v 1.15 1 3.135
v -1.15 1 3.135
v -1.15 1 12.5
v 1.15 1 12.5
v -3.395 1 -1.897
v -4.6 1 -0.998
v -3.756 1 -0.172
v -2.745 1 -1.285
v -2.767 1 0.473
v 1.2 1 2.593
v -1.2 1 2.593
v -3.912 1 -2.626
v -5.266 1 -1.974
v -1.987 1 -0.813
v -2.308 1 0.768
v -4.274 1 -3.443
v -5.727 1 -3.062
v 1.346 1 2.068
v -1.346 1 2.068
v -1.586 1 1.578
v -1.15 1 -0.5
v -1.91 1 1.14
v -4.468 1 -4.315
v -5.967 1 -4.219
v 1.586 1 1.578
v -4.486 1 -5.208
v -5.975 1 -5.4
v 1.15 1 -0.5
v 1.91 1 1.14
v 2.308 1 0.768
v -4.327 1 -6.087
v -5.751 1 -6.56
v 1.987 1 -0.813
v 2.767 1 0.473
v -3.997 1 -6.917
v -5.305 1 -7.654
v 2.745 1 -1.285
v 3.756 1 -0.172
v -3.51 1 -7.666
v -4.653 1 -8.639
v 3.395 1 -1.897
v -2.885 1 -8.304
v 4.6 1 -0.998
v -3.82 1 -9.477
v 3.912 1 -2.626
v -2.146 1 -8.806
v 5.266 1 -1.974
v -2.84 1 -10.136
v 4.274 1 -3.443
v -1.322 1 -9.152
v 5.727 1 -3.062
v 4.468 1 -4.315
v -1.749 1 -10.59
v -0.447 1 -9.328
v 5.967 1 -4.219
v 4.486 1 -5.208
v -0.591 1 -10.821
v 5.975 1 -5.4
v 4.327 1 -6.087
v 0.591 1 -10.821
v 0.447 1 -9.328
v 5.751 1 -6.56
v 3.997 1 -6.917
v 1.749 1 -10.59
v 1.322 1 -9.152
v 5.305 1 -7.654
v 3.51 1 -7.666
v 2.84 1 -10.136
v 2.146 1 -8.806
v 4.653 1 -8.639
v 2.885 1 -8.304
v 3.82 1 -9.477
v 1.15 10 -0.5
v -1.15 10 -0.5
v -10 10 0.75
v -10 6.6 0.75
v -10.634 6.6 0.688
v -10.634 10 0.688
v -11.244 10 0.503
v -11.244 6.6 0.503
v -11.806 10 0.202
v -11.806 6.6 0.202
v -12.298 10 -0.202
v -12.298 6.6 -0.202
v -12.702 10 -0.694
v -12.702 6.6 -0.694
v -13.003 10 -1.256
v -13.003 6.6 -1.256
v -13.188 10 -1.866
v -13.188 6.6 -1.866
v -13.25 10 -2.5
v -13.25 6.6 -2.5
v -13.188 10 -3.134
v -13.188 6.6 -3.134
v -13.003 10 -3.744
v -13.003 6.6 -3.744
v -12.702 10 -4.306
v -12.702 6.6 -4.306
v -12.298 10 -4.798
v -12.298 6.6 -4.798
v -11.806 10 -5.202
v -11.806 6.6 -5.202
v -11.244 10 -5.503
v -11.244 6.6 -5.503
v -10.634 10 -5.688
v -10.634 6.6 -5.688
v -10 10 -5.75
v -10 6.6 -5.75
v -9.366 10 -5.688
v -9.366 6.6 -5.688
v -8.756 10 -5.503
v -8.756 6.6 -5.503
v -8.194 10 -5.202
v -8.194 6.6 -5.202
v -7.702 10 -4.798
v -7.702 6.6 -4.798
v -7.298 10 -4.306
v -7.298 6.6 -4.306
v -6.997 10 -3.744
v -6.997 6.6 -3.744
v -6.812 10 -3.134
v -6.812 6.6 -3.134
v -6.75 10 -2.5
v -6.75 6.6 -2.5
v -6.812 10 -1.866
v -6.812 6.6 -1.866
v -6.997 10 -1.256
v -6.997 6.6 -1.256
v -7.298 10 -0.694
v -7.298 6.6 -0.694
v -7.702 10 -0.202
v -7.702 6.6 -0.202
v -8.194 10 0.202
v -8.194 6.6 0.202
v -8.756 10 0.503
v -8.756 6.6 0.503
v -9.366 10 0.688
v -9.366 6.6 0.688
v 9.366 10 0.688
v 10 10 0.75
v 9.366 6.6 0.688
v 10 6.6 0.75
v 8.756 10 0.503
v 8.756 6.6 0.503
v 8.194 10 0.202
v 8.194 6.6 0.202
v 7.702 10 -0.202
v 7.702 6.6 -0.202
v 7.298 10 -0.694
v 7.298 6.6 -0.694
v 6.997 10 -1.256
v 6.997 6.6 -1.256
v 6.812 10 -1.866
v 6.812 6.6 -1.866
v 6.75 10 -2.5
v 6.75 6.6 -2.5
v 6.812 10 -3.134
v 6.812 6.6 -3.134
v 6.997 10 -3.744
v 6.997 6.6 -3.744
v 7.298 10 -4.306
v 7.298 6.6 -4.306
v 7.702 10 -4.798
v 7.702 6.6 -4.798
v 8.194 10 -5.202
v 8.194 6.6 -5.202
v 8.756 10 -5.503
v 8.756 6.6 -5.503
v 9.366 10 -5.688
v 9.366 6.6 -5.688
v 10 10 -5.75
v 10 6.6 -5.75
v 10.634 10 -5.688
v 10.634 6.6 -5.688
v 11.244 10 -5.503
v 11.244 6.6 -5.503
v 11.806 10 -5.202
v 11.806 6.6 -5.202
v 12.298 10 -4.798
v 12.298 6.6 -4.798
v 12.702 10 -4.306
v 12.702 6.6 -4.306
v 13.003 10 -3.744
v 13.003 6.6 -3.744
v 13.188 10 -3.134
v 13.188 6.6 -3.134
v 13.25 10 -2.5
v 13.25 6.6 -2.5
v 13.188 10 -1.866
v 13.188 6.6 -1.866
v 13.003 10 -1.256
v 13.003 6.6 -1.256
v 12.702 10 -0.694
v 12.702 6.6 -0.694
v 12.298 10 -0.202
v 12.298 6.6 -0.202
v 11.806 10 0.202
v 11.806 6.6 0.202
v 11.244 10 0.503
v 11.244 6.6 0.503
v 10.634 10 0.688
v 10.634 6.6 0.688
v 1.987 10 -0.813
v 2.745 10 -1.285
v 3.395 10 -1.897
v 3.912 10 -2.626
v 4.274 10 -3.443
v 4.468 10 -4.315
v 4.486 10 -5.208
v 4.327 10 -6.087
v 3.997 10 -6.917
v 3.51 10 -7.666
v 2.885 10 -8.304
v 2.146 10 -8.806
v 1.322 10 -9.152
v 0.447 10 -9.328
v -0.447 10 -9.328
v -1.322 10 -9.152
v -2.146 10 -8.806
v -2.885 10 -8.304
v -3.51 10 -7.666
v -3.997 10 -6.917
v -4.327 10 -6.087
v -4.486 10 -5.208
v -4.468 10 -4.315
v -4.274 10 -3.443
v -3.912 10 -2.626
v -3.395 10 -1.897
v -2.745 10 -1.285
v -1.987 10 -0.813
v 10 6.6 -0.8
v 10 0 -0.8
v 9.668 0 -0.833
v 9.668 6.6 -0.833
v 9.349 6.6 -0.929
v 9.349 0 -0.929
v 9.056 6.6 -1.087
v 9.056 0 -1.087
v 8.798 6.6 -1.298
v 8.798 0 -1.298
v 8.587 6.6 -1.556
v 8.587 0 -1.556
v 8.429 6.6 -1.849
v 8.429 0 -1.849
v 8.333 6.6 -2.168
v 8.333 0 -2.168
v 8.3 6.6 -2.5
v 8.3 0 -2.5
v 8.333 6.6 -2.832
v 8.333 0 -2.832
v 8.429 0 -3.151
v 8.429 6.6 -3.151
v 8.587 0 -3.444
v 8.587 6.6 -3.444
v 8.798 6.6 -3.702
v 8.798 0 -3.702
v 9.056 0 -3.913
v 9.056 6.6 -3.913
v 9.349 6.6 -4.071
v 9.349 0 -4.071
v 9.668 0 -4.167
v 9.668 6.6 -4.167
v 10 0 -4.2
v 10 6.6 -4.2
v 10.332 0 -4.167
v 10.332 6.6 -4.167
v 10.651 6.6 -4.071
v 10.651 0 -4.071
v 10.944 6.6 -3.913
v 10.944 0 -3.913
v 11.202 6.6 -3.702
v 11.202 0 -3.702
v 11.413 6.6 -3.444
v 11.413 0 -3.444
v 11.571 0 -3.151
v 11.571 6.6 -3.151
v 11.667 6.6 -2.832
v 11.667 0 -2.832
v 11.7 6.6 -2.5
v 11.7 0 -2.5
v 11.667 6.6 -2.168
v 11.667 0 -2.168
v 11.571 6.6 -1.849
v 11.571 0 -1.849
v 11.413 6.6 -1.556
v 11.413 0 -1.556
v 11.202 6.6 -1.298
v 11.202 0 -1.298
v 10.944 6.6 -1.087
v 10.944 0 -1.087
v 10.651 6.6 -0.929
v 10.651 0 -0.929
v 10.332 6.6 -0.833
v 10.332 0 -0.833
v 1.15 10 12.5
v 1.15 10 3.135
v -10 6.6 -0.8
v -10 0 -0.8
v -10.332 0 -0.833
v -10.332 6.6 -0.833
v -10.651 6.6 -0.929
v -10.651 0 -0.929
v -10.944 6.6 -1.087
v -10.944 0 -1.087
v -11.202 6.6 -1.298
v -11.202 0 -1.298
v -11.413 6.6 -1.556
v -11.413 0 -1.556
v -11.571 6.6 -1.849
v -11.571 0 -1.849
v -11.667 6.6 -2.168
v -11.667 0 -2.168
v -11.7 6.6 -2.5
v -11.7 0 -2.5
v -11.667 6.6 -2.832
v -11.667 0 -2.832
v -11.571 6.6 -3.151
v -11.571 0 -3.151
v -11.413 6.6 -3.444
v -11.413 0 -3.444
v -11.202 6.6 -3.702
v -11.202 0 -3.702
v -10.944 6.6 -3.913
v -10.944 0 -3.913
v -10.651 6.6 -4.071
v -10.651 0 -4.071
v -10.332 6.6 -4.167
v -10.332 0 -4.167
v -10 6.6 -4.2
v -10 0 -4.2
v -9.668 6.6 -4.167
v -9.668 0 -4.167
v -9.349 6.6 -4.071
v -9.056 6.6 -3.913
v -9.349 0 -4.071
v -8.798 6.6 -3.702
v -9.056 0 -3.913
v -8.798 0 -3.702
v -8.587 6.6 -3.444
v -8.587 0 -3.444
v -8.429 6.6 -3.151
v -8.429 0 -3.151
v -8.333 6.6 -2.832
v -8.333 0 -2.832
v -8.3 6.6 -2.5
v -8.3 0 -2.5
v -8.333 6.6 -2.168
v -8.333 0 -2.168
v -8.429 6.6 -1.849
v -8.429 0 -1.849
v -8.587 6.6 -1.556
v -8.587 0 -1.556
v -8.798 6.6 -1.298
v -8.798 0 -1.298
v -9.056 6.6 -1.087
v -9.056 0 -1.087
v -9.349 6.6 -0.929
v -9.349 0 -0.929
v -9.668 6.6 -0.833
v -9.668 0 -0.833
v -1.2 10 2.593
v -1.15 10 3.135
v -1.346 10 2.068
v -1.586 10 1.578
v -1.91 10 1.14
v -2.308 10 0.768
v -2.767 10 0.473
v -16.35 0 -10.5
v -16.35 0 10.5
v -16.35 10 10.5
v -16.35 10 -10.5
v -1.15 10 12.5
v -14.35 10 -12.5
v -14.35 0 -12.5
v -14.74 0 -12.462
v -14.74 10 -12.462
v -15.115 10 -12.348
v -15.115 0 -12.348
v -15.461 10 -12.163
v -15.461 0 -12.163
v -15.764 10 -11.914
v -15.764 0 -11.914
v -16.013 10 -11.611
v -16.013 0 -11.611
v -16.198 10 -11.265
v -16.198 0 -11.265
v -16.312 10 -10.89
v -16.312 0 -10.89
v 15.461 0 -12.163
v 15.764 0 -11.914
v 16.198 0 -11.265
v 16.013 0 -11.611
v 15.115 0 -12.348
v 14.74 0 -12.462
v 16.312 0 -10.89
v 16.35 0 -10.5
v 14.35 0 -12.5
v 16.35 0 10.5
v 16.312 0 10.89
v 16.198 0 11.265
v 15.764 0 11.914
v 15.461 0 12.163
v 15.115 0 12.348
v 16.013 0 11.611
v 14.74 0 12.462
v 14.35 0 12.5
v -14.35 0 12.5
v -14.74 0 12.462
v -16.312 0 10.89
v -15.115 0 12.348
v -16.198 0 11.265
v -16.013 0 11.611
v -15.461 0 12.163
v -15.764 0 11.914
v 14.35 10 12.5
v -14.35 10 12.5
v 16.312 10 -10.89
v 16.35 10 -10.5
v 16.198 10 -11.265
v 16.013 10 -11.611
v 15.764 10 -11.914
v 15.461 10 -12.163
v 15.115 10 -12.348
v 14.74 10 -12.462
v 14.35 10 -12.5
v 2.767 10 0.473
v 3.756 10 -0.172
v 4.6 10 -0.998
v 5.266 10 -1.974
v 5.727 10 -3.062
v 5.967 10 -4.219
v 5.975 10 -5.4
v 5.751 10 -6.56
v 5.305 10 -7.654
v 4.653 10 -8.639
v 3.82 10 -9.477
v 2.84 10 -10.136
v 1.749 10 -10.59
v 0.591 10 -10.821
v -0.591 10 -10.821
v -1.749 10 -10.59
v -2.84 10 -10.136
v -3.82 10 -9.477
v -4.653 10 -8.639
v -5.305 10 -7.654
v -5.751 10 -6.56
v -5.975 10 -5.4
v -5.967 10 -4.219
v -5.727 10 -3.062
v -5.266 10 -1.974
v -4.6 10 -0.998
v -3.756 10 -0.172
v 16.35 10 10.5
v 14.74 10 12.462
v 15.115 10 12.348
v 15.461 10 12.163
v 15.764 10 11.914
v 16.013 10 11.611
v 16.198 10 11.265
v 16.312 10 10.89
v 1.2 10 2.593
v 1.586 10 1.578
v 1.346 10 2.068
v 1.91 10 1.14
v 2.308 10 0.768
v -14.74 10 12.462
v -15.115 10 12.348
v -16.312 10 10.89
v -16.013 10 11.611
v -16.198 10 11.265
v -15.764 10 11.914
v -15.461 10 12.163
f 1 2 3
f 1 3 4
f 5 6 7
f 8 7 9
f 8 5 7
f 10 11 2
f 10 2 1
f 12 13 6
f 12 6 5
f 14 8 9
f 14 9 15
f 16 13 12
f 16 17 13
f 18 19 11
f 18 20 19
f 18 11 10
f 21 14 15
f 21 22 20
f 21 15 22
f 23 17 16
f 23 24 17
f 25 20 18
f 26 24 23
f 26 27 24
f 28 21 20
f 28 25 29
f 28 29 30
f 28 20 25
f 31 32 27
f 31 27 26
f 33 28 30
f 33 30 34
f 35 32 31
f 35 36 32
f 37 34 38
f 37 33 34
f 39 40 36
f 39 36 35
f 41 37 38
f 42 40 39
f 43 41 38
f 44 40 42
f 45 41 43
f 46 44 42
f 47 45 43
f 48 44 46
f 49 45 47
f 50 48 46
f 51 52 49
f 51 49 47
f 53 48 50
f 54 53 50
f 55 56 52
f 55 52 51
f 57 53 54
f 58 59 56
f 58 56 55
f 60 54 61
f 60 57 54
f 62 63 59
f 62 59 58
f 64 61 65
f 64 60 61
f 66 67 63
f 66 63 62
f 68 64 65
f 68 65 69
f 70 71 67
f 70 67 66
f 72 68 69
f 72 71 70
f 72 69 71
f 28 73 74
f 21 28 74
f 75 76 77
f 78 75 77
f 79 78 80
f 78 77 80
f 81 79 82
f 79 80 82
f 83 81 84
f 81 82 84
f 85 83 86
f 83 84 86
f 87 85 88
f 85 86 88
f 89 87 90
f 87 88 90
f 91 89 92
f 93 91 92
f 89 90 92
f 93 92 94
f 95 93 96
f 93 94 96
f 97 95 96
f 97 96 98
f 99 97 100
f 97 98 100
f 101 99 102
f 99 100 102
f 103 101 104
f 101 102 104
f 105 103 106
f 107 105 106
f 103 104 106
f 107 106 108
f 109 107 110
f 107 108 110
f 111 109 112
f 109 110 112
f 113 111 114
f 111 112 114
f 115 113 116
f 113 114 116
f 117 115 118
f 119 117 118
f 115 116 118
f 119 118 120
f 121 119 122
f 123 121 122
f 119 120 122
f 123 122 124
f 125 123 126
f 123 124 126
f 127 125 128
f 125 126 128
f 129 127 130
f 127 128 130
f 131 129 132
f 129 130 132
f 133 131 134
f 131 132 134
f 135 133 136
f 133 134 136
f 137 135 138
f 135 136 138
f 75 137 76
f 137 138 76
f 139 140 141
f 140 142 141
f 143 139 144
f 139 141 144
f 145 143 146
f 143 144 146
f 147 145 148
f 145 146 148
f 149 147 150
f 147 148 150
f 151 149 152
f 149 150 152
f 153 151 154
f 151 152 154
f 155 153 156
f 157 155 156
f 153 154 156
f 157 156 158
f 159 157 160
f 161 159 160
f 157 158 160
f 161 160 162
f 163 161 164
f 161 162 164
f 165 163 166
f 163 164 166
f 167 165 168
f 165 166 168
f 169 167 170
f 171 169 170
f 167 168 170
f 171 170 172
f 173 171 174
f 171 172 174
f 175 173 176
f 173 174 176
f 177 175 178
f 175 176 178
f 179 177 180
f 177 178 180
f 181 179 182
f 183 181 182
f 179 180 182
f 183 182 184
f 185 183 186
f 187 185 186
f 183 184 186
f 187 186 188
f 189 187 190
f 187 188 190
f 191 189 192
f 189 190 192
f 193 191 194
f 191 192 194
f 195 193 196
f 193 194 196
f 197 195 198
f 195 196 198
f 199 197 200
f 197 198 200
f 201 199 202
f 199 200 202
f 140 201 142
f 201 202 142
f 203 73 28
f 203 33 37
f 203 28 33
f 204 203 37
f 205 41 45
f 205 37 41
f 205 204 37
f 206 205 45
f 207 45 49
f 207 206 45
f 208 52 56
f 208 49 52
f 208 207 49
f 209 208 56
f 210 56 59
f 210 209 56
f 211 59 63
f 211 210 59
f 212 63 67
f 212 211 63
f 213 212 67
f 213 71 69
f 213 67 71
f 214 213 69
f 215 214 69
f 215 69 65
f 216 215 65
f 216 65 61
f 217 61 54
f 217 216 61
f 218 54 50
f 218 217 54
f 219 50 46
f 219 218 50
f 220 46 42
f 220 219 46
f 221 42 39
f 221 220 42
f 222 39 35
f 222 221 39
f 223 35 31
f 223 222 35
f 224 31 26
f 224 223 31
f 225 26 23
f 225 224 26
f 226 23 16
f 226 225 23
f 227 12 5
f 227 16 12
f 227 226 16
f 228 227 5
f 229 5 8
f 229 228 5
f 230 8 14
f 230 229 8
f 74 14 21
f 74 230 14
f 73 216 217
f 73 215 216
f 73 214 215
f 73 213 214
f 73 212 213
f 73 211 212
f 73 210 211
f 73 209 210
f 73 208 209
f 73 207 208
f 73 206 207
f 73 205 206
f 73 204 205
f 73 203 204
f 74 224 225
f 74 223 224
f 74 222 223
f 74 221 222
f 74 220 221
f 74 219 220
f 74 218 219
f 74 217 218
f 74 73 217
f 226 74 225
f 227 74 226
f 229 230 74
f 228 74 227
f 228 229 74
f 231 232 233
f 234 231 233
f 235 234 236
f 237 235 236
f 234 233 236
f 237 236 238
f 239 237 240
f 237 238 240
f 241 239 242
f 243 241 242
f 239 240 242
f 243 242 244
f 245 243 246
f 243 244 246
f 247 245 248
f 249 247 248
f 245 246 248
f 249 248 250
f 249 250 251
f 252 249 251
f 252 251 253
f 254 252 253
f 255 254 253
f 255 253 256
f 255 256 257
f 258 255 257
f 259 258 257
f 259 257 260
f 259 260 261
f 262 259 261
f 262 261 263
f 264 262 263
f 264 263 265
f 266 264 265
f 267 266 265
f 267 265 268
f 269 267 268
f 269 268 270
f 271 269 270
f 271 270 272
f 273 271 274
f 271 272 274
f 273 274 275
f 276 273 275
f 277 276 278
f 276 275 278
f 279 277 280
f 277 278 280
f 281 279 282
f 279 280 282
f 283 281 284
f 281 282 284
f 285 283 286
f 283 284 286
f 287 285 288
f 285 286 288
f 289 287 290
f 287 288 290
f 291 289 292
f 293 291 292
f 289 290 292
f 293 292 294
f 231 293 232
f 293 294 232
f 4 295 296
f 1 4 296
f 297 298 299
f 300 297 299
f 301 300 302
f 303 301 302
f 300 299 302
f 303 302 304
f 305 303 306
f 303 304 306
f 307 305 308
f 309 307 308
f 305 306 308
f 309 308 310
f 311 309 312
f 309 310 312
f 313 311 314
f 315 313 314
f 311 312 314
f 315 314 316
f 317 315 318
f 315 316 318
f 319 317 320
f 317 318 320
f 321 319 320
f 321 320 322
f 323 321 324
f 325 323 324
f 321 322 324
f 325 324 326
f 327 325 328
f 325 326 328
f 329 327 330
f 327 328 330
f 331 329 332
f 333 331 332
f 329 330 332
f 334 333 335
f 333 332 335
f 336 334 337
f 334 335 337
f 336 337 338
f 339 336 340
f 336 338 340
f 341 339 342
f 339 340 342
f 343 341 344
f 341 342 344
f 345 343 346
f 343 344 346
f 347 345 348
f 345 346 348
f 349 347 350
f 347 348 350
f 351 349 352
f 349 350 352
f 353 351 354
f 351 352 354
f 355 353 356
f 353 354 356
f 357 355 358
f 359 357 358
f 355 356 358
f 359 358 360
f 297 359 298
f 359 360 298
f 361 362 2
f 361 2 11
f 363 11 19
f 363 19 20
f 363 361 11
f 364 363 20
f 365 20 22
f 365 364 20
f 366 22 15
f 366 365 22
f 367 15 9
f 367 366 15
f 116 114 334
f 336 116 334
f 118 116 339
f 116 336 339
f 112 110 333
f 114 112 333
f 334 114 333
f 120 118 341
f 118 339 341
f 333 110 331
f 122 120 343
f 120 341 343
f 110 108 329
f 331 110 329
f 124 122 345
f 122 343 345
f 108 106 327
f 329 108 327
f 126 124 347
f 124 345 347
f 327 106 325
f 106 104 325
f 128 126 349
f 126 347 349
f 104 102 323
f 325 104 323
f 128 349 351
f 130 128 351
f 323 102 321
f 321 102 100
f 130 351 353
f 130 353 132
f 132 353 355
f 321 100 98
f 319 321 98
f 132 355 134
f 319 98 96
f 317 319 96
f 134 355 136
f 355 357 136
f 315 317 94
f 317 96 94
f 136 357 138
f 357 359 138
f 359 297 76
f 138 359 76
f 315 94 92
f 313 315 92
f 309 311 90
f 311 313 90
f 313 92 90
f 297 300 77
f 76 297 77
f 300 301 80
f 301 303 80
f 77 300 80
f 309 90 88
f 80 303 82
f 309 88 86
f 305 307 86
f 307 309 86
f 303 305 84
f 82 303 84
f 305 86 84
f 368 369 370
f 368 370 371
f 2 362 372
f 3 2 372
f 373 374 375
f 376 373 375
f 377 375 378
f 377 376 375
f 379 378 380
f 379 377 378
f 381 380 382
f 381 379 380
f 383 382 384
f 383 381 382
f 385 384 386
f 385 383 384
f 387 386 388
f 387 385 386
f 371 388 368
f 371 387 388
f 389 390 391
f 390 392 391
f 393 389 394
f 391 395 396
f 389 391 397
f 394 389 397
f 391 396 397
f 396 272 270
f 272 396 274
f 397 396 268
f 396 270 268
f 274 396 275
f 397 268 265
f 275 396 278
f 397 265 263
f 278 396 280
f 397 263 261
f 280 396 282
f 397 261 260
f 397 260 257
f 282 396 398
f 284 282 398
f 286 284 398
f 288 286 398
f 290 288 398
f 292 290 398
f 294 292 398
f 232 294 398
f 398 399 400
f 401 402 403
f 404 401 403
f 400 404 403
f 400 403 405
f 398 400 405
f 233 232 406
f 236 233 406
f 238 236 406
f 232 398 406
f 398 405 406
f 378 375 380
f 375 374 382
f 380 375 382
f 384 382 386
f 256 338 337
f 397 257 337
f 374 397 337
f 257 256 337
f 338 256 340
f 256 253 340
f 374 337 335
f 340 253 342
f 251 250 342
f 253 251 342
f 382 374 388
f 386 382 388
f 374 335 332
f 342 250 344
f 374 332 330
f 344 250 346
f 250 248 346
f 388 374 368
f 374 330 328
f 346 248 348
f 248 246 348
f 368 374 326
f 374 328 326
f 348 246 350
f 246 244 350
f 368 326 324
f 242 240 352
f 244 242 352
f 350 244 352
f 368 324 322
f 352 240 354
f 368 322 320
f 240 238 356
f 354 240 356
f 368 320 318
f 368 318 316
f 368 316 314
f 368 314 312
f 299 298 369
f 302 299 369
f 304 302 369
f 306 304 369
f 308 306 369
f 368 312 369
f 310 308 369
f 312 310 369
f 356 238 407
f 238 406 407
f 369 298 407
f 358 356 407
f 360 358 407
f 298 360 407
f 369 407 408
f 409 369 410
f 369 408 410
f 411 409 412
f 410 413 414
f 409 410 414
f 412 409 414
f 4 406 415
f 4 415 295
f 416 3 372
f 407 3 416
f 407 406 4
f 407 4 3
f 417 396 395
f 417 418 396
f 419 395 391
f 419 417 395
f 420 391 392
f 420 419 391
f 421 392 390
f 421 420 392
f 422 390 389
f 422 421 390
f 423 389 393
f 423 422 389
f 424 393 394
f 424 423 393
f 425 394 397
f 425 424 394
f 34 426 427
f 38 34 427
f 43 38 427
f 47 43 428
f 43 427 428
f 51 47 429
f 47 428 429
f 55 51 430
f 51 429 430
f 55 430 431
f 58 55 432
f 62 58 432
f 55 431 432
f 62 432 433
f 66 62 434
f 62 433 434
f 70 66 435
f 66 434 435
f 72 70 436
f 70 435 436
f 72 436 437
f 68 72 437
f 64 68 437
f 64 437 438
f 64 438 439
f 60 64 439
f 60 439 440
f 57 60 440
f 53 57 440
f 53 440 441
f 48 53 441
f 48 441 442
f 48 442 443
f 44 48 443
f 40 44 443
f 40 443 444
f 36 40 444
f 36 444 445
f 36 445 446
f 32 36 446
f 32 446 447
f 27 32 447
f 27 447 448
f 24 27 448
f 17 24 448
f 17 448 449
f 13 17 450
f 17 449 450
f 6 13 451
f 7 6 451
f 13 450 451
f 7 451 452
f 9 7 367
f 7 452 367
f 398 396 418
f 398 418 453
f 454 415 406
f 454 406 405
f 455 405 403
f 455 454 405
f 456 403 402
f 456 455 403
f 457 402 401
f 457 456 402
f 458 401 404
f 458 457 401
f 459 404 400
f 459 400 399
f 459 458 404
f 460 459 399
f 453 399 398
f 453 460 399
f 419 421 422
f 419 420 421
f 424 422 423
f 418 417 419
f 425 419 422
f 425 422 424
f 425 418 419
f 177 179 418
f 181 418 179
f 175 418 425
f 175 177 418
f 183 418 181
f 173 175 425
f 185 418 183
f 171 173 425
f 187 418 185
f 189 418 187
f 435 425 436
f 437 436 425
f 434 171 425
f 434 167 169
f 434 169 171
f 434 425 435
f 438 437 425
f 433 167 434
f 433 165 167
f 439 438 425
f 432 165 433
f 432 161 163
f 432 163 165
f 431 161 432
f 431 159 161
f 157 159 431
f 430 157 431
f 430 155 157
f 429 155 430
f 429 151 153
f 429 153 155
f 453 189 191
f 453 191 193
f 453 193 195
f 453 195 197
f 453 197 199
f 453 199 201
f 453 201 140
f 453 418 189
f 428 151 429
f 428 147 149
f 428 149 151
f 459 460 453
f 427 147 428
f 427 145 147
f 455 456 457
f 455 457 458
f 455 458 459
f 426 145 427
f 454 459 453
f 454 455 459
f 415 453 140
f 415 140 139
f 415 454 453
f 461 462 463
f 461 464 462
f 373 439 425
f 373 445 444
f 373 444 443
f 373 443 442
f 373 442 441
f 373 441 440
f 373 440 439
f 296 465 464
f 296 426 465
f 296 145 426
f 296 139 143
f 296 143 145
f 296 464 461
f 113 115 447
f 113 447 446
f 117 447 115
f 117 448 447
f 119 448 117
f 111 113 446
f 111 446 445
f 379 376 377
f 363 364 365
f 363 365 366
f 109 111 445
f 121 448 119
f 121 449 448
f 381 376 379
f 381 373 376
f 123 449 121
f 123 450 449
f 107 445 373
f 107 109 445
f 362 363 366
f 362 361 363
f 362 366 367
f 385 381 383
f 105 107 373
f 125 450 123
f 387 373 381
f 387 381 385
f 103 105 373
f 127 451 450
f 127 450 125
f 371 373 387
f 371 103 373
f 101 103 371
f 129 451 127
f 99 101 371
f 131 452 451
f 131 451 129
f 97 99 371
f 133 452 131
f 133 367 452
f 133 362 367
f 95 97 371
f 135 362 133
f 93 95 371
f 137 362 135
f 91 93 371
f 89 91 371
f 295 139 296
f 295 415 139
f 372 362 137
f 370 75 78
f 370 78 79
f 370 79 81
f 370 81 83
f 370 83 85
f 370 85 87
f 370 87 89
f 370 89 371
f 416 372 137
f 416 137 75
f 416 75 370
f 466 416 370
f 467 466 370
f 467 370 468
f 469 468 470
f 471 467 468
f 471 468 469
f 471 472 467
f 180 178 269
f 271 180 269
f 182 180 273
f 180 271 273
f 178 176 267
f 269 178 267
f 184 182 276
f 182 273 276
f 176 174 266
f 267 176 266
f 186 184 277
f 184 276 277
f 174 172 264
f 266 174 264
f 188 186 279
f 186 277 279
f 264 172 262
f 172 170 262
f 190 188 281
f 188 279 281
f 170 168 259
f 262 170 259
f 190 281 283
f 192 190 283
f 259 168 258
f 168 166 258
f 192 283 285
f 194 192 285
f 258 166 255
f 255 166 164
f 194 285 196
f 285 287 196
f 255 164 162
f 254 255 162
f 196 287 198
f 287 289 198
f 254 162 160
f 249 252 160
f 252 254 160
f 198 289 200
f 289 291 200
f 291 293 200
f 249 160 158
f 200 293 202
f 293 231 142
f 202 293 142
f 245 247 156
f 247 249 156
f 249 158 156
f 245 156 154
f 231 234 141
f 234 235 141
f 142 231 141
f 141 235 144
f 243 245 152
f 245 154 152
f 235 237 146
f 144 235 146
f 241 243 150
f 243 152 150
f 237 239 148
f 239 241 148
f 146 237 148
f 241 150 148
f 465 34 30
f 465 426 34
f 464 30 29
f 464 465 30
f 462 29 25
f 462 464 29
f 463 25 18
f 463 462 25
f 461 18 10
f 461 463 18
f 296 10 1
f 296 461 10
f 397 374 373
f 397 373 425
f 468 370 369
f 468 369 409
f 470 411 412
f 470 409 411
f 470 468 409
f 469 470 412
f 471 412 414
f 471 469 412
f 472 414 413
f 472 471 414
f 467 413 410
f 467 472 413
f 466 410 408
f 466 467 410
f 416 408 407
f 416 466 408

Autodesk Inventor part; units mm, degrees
ref_plane "YZ Plane" through (0, 0, 0) normal (1, 0, 0) x (0, 1, 0)
ref_plane "XZ Plane" through (0, 0, 0) normal (0, 1, 0) x (-1, 0, 0)
ref_plane "XY Plane" through (0, 0, 0) normal (0, 0, 1) x (1, 0, 0)
sketch "Skizze1" plane through (0, 0, 0) normal (0, 1, 0) x (-1, 0, 0)
  line L0 (-16.35, 12.5) -> (16.35, 12.5)
  line L1 (16.35, 12.5) -> (16.35, -12.5)
  line L2 (16.35, -12.5) -> (-16.35, -12.5)
  line L3 (-16.35, -12.5) -> (-16.35, 12.5)
  line L4 (-16.35, 12.5) -> (16.35, -12.5) construction
  line L5 (16.35, 12.5) -> (-16.35, -12.5) construction
  point P0 (0, 0)
  dimension "d0" = 32.7
  dimension "d1" = 25
extrude "Extrusion1" add sketch "Skizze1" along normal blind 10
sketch "Skizze3" plane through (0, 10, 0) normal (0, 1, 0) x (1, 0, 0)
  line L0 (0, 17.5) -> (0, -17.5) projected
  line L1 (-16.35, -12.5) -> (16.35, -12.5) projected
  line L2 (-1.15, -12.5) -> (1.15, -12.5)
  line L3 (1.15, -12.5) -> (1.15, 0.5)
  line L4 (1.15, 0.5) -> (-1.15, 0.5)
  line L5 (-1.15, 0.5) -> (-1.15, -12.5)
  point P0 (0, 0)
  point P1 (1.15, -12.5)
  dimension "d11" = 2.3
  dimension "d12" = 13
extrude "Extrusion2" cut sketch "Skizze3" against normal blind 9
sketch "Skizze4" plane through (0, 10, 0) normal (0, 1, 0) x (1, 0, 0)
  line L0 (-1.15, -12.5) -> (-1.15, 0.5) projected
  circle A0 centre (0, 4.8506) radius 4.5
  line L1 (0, 17.5) -> (0, -17.5) projected
  circle A1 centre (0, 4.8506) radius 6
  point P0 (0, 0)
  point P1 (-1.15, -1.0382)
  point P2 (0, 0.3506)
  point P3 (0, 10.8506)
  point P4 (0, 9.3506)
  point P5 (0, -1.1494)
  dimension "d16" = 9
  dimension "d17" = 1.5
extrude "Extrusion3" cut sketch "Skizze4" against normal up to surface (9 mm away) contours A1 L1 A0 L0 | L0 A0 L1 A1 | A1 L1 A0
fillet "Rundung1" radius 3 2 edges at (-1.15, 5.5, 1.0382) (1.15, 5.5, 1.0382)
sketch "Skizze5" plane through (0, 10, 0) normal (0, 1, 0) x (1, 0, 0)
  line L0 (0, 17.5) -> (0, -17.5) projected
  line L1 (16.35, 12.5) -> (-16.35, 12.5) projected
  point P0 (0, 0)
  point P1 (-10, 2.5)
  point P2 (10, 2.5)
  dimension "d21" = 10
  dimension "d22" = 20
hole "Bohrung2" at (-10, 10, -2.5) at (10, 10, -2.5) direction (0, -1, 0) diameter 3.4 end through all counterbore diameter 6.5 counterbore depth 3.4 clearance for "Inbusschraube ISO 4762" size "M3" standard "ISO"
fillet "Rundung2" radius 2 4 edges at (16.35, 5, 12.5) (16.35, 5, -12.5) (-16.35, 5, -12.5) (-16.35, 5, 12.5)
properties part number "19_Belt_holder" material "PET-Kunststoff"
